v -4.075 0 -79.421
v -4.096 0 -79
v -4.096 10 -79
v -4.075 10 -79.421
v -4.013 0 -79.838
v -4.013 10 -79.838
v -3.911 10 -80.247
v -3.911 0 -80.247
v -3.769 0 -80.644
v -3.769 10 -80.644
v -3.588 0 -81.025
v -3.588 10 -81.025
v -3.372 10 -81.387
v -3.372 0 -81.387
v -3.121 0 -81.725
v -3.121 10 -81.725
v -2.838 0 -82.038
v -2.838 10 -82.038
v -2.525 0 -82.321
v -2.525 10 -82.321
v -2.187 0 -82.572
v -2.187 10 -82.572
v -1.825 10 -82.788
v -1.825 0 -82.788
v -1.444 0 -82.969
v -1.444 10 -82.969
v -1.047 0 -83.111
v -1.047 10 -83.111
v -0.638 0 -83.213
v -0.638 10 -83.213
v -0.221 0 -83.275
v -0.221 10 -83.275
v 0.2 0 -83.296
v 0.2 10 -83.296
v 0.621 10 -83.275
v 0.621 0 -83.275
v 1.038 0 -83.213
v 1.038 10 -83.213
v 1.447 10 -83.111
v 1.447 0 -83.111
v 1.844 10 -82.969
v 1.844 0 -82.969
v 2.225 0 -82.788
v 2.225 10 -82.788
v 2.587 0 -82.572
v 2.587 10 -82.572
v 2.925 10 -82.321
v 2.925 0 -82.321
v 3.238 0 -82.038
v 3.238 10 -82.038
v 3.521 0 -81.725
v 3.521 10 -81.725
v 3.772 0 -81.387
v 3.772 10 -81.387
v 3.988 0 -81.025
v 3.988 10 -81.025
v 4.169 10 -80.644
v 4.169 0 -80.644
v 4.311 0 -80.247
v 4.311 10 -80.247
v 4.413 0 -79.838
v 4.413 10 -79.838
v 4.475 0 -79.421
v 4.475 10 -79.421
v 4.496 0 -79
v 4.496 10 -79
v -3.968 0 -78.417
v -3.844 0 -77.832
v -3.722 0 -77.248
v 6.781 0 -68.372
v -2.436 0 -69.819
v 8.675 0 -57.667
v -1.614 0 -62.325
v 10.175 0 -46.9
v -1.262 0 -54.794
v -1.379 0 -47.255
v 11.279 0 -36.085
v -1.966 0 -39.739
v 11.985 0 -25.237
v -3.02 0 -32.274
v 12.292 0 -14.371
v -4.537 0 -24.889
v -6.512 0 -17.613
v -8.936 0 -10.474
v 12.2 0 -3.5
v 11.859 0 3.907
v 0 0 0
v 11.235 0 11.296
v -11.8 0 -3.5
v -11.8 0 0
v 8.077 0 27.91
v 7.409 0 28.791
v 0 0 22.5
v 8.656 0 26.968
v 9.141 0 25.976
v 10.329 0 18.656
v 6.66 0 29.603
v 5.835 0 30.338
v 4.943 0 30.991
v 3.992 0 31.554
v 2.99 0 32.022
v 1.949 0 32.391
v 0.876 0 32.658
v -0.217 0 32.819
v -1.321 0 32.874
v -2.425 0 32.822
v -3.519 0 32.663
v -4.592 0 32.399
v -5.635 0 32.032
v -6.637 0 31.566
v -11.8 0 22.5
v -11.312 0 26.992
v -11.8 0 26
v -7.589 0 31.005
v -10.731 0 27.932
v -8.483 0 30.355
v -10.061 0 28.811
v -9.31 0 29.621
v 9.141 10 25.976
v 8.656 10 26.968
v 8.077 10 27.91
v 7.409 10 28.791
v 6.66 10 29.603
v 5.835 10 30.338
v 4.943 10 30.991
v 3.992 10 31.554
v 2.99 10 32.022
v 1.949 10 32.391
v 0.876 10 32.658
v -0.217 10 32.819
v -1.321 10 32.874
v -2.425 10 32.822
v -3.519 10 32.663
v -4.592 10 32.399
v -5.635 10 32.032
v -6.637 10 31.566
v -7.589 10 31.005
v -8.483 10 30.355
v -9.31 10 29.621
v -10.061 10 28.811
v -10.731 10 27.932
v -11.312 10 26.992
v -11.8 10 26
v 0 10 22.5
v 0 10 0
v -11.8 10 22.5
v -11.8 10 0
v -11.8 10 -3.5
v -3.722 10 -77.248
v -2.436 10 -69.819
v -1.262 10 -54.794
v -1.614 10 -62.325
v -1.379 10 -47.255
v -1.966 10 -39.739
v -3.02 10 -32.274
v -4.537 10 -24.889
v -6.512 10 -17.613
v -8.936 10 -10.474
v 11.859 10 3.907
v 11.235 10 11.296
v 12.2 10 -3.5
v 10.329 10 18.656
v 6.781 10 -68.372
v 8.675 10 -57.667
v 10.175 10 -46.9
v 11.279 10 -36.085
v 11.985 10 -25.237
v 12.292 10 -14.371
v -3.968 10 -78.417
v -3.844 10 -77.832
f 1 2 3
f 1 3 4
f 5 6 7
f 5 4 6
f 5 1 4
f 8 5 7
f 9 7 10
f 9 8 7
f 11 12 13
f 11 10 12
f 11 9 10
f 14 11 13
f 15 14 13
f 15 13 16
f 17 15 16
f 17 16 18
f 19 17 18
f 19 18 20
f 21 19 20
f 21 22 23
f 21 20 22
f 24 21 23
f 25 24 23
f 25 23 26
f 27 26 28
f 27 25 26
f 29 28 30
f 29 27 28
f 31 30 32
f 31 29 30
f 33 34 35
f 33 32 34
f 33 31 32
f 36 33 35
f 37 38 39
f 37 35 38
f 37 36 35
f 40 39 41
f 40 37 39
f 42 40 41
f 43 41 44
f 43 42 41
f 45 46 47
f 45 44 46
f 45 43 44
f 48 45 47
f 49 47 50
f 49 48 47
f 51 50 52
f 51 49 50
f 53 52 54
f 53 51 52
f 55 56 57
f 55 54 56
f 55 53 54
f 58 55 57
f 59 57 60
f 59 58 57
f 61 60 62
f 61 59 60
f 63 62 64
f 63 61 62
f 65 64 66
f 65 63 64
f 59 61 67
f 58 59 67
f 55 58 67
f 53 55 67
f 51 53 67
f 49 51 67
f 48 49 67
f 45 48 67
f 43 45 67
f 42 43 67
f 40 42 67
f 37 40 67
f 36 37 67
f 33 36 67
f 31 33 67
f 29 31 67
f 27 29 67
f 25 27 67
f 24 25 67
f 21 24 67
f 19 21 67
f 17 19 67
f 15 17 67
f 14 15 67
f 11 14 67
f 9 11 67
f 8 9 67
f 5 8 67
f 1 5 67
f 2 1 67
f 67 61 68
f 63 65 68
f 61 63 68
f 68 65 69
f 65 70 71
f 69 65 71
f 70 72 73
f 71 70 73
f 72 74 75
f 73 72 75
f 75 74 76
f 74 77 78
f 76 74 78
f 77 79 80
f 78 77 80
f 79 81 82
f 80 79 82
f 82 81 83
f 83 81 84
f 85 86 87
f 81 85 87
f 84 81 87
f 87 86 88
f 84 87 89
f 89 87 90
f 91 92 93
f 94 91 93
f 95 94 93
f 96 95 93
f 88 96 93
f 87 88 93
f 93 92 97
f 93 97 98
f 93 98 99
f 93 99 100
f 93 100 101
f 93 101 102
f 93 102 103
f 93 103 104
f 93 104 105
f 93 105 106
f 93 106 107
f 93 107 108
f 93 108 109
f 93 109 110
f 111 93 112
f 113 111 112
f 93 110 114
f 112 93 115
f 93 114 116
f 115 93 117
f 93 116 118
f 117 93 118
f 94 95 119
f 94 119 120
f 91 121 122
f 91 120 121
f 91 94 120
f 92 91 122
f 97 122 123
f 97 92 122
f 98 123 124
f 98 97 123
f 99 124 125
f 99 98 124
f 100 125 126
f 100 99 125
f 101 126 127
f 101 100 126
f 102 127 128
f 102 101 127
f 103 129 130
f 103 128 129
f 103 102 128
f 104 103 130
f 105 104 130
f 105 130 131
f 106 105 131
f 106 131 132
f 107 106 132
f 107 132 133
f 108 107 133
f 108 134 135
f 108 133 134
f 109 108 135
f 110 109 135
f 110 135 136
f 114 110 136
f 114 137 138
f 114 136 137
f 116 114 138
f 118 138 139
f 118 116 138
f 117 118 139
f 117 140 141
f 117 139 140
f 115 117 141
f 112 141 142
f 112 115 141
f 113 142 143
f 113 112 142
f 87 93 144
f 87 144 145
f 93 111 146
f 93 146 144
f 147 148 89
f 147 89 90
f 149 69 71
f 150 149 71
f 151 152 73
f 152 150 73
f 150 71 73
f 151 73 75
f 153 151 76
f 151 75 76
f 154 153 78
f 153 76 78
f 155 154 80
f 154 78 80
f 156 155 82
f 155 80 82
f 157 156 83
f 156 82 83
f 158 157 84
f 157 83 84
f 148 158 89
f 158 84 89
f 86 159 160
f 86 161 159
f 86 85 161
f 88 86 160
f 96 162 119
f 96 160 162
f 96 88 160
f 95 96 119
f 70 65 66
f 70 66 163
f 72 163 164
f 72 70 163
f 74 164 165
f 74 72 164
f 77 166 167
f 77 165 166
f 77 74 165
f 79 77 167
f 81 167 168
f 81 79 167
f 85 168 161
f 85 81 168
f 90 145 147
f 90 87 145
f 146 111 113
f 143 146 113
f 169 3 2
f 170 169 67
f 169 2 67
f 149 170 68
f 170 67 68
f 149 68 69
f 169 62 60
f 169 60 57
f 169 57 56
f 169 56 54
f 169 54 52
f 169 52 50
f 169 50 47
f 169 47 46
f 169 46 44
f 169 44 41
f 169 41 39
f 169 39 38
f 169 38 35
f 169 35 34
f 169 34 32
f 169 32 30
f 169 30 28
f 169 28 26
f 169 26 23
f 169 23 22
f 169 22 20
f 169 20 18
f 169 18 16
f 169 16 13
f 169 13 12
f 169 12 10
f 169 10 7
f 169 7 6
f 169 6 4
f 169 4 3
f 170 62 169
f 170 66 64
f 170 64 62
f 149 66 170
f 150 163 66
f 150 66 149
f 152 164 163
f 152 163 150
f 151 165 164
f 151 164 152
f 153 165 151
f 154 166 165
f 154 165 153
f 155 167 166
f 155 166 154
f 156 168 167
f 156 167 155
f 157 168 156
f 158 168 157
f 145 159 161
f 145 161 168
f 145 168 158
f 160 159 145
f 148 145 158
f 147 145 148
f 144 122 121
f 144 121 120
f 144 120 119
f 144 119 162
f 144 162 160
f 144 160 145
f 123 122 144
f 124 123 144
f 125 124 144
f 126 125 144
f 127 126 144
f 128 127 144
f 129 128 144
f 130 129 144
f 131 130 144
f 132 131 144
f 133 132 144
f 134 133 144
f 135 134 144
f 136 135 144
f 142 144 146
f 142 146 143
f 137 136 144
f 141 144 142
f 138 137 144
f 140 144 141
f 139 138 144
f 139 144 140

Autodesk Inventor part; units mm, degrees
ref_plane "YZ Plane" through (0, 0, 0) normal (1, 0, 0) x (0, 1, 0)
ref_plane "XZ Plane" through (0, 0, 0) normal (0, 1, 0) x (-1, 0, 0)
ref_plane "XY Plane" through (0, 0, 0) normal (0, 0, 1) x (1, 0, 0)
sketch "Sketch2" plane through (0, 0, 0) normal (0, 1, 0) x (-1, 0, 0)
  line L0 (0, 0) -> (11.8, 0)
  line L1 (11.8, 16.9404) -> (11.8, 22.5)
  line L2 (11.8, 22.5) -> (0, 22.5)
  line L3 (0, 22.5) -> (0, 0)
  arc A0 (-9.1414, 25.9755) -> (-12.2, -3.5) centre (181.3562, -8.6883) ccw
  arc A1 (11.8, 26) -> (-9.1414, 25.9755) centre (1.3346, 21.4702) ccw
  arc A2 (-4.4957, -79) -> (3.7221, -77.2478) centre (-0.2, -79) ccw
  arc A3 (-12.2, -3.5) -> (-4.4957, -79) centre (283.8313, -11.4351) ccw
  arc A4 (11.8, -3.5) -> (4.0957, -79) centre (122.1776, -52.9064) ccw
  line L4 (11.8, -3.5) -> (11.8, 0)
  line L5 (11.8, 22.5) -> (11.8, 26)
  dimension "d2" = 11.8
  dimension "d3" = 22.5
extrude "Extrusion1" add sketch "Sketch2" along normal blind 10 contours L0 L4 A4 A2 A3 A0 A1 L5 L2 L3
